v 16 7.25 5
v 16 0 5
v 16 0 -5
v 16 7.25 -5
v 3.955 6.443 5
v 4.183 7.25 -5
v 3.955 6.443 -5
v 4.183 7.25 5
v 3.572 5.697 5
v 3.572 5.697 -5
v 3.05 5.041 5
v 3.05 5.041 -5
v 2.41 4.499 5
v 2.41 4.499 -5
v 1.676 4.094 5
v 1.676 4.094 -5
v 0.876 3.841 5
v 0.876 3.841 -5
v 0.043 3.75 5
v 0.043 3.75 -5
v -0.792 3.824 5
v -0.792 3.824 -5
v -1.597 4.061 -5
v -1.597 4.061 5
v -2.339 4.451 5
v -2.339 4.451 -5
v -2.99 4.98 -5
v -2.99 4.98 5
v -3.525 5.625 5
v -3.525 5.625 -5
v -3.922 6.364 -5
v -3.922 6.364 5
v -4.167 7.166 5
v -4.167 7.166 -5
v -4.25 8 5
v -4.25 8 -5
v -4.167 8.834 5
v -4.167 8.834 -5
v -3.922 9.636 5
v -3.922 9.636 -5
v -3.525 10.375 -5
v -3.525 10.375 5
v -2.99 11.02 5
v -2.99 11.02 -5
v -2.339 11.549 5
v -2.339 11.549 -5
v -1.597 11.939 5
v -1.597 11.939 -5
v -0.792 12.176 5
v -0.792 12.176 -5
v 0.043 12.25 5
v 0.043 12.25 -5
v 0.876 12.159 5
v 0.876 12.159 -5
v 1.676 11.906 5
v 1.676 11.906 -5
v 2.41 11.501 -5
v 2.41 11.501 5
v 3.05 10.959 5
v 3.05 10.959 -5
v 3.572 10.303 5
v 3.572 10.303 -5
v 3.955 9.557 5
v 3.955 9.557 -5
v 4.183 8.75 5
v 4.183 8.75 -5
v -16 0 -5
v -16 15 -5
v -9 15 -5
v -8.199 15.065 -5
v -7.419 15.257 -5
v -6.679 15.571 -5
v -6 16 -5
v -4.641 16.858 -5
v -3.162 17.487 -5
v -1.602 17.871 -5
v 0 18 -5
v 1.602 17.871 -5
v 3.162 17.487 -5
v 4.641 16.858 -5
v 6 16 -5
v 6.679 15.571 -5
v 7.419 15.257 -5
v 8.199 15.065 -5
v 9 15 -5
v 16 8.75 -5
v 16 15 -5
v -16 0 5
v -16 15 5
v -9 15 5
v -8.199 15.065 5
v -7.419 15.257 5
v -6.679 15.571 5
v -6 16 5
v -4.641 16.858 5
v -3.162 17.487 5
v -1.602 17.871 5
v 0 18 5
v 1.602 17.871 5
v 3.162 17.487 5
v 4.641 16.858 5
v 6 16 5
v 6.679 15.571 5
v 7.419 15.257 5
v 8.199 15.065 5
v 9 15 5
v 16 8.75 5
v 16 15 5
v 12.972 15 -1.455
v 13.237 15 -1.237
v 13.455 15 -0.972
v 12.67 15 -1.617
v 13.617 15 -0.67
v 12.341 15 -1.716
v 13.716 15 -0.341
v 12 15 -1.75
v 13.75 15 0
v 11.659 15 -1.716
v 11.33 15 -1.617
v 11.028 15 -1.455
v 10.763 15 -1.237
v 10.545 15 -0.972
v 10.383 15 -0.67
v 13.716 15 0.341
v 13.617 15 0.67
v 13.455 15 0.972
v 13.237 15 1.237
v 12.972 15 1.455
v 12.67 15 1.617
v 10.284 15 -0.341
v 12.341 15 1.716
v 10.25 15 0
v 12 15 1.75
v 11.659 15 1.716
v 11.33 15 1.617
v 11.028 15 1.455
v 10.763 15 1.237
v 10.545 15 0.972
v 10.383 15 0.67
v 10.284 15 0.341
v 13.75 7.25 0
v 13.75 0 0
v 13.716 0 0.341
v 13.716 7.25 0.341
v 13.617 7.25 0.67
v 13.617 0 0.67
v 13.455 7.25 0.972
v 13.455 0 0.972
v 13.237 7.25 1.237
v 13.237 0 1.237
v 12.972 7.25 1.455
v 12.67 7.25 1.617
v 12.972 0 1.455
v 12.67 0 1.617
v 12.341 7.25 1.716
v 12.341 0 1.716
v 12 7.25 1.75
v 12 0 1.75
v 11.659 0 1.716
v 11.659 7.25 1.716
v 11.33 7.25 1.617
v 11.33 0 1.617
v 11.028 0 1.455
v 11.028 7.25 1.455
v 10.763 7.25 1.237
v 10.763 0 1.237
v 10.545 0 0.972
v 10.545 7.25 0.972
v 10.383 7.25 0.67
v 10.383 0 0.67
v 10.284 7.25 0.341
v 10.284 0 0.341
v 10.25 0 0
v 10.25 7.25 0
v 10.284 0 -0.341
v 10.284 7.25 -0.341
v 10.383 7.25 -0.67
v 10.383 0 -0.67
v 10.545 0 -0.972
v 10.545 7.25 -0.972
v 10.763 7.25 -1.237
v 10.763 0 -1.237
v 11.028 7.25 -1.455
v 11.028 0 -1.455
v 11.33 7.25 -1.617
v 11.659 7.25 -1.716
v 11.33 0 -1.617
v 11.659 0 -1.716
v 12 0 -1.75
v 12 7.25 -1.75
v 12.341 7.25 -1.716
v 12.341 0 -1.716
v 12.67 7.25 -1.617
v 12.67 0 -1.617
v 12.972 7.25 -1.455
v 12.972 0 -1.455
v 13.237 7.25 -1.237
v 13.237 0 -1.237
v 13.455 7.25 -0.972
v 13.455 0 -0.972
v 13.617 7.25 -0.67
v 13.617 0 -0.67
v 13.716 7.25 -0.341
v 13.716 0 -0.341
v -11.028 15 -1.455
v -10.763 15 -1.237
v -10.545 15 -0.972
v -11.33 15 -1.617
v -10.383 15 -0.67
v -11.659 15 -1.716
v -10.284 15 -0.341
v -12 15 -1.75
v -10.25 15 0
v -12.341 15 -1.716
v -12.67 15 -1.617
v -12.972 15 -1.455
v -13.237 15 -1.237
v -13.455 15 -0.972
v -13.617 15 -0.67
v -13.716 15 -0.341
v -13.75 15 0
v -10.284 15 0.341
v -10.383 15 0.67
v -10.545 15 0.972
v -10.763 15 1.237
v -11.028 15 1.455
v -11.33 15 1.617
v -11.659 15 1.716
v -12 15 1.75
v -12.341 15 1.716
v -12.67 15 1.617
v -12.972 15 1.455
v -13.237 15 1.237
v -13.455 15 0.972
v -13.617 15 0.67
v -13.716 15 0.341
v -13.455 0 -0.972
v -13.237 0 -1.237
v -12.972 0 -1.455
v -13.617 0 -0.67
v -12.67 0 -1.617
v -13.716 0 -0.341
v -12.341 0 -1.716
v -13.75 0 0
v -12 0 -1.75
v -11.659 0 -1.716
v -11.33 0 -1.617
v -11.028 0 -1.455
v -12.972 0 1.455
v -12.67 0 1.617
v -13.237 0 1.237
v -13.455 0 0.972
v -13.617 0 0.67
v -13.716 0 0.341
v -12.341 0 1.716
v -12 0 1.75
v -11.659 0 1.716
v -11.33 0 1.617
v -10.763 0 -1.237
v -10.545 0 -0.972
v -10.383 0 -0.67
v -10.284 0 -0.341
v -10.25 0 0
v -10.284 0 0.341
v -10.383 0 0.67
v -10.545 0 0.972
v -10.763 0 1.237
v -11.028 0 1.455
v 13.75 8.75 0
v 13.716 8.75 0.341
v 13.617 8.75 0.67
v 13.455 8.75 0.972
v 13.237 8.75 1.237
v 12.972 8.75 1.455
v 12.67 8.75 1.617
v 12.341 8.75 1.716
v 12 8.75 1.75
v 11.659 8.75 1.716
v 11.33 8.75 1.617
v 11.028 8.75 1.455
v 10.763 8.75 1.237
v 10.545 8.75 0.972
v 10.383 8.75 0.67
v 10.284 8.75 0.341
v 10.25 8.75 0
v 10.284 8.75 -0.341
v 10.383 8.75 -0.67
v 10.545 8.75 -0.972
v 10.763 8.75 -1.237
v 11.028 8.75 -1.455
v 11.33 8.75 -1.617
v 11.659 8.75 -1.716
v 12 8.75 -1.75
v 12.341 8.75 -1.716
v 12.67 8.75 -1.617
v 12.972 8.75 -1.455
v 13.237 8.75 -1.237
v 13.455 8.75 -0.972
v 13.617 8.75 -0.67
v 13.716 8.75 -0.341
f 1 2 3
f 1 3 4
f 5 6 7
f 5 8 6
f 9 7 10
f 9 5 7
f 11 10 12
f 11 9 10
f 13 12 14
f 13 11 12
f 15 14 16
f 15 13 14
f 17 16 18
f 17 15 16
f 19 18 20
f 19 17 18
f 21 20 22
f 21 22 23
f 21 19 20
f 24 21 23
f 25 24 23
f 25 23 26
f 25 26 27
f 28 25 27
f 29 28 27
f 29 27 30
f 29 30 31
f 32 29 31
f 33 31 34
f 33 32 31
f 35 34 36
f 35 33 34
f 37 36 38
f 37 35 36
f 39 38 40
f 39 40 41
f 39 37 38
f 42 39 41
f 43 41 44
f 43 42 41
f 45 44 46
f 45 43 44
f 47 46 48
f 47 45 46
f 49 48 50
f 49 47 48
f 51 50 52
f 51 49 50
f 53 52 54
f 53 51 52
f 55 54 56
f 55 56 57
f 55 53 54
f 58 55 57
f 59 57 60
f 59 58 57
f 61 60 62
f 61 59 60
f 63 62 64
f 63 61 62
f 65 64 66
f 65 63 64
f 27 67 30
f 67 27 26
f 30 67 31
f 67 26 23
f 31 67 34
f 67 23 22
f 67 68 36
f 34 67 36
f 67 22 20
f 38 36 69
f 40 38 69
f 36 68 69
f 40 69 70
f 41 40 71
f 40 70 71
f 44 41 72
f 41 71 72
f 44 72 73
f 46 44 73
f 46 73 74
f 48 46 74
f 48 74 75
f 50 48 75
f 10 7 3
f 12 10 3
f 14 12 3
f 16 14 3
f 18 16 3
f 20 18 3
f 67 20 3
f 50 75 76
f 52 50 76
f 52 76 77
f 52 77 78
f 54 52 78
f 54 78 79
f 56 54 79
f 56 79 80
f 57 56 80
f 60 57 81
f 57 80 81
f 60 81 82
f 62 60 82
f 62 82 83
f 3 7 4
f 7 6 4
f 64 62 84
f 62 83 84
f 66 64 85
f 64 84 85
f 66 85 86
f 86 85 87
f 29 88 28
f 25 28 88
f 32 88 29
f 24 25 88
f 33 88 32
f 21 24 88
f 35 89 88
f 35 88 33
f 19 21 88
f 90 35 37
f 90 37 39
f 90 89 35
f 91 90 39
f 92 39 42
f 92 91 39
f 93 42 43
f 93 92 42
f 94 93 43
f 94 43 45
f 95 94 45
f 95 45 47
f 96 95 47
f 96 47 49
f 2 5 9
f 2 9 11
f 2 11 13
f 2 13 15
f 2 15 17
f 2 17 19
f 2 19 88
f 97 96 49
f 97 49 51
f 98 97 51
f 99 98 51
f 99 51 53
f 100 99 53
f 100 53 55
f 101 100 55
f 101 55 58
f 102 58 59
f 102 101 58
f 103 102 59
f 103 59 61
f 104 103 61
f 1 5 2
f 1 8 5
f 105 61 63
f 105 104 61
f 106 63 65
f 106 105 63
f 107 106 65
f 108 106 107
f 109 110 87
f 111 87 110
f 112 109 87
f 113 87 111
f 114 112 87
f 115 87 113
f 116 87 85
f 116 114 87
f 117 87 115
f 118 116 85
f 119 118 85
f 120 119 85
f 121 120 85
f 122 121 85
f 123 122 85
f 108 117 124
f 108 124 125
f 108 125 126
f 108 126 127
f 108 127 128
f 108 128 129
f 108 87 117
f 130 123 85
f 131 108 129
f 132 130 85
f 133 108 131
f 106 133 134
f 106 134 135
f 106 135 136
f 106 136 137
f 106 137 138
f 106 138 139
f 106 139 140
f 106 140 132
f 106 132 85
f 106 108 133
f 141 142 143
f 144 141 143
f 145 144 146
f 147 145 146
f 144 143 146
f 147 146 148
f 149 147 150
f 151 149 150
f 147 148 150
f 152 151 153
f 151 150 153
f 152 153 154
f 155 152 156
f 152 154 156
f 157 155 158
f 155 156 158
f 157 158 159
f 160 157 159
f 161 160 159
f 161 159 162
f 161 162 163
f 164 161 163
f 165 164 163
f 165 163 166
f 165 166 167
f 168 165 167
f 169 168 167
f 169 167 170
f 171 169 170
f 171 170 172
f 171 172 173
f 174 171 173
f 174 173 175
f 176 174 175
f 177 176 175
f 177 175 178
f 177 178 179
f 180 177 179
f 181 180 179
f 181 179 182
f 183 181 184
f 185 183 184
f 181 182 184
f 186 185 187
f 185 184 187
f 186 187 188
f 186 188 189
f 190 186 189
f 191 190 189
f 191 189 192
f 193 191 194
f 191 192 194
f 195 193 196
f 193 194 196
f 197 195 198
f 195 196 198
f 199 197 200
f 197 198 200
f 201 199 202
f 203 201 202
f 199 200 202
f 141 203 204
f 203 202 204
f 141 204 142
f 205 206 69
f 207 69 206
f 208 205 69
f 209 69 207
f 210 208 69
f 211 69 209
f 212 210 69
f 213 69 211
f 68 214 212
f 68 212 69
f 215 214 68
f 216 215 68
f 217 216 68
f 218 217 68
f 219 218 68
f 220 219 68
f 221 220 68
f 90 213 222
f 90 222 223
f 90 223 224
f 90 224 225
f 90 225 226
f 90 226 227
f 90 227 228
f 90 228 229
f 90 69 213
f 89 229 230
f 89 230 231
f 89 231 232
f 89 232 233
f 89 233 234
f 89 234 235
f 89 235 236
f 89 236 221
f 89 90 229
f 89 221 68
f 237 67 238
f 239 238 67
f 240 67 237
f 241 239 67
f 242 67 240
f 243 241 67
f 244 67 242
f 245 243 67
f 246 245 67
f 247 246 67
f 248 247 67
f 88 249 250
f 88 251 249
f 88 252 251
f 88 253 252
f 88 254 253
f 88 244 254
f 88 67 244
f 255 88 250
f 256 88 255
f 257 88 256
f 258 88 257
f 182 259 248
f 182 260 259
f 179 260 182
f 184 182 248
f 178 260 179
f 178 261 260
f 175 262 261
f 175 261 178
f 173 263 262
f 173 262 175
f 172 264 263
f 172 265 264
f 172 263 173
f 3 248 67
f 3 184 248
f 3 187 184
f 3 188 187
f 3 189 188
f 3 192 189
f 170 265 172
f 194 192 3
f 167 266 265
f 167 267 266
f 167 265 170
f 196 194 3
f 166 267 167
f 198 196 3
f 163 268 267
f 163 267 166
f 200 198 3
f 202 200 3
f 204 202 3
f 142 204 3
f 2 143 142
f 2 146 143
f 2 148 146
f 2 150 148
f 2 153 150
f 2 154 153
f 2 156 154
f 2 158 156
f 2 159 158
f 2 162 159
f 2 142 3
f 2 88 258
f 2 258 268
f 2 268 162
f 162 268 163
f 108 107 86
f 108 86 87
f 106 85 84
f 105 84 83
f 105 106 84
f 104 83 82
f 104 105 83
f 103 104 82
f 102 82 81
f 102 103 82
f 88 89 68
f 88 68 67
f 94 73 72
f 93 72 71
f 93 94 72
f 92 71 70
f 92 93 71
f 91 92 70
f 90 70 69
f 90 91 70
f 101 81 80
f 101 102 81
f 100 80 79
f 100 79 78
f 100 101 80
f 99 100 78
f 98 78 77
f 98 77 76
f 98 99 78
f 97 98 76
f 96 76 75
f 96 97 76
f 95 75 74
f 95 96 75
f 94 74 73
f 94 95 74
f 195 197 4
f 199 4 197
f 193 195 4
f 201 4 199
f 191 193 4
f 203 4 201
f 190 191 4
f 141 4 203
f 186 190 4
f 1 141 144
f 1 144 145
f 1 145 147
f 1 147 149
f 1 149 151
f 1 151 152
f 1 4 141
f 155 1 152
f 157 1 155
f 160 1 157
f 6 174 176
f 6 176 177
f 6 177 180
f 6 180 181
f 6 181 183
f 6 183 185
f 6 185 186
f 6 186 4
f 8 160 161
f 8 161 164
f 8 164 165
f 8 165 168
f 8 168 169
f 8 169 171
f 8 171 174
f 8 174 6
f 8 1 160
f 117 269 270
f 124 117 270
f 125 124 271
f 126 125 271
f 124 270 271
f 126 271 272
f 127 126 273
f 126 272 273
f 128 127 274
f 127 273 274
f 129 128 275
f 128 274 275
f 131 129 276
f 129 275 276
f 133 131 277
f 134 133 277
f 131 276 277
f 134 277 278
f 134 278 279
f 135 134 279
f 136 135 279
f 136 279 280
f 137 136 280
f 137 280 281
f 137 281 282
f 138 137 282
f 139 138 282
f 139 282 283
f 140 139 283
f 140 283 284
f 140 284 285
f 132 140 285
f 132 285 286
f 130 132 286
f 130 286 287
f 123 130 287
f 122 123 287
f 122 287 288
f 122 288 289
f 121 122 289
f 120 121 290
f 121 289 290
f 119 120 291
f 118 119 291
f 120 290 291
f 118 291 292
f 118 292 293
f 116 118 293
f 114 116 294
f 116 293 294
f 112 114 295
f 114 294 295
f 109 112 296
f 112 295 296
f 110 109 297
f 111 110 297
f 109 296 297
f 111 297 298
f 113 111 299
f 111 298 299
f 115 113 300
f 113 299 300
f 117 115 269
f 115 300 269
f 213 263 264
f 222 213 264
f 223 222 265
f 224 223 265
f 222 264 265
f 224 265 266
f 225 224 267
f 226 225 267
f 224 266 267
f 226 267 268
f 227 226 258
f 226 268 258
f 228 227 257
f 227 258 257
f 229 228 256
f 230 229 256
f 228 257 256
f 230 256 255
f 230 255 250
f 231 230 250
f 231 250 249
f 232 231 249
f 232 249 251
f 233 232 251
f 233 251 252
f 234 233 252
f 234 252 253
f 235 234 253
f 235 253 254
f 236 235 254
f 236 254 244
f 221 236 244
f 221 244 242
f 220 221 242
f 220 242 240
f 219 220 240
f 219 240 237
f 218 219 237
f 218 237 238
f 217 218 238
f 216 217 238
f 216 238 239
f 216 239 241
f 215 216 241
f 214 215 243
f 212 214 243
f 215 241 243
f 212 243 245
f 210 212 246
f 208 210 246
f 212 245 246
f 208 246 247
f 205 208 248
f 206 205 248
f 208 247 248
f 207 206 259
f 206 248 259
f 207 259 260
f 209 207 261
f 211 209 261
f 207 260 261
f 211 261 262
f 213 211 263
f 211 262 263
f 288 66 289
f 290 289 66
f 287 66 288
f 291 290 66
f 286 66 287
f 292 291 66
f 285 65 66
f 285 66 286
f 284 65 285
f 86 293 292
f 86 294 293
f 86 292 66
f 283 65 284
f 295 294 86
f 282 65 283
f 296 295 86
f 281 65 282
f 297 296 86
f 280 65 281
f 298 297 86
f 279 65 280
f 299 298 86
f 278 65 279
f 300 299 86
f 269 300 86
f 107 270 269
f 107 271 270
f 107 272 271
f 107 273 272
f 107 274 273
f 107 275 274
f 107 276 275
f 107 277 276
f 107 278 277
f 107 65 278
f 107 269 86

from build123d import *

# Parameters (mm, degrees)
SALIENTE_EXTRUIR1_DEPTH      = 5
SALIENTE_EXTRUIR1_DEPTH_BACK = 5
CROQUIS6_R                   = 1.75
CORTAR_EXTRUIR4_DEPTH        = 25.596747752
REDONDEO1_R                  = 5


with BuildPart() as part:
    # Croquis1 → Saliente-Extruir1 (new, two sides: drawn at the far end of the back side and taken through both)
    with BuildSketch(Plane.XY.offset(-SALIENTE_EXTRUIR1_DEPTH_BACK)):
        with BuildLine():
            Line((4.183300133, 8.75), (16, 8.75))
            Line((16, 8.75), (16, 15))
            Line((16, 15), (7.141428429, 15))
            ThreePointArc((7.141428429, 15), (0, 18), (-7.141428429, 15))
            Line((-7.141428429, 15), (-16, 15))
            Line((-16, 15), (-16, 0))
            Line((-16, 0), (16, 0))
            Line((16, 0), (16, 7.25))
            Line((16, 7.25), (4.183300133, 7.25))
            ThreePointArc((4.183300133, 7.25), (-4.25, 8), (4.183300133, 8.75))
        make_face()
    extrude(amount=SALIENTE_EXTRUIR1_DEPTH + SALIENTE_EXTRUIR1_DEPTH_BACK)

    # Croquis6 → Cortar-Extruir4 (cut, through all)
    with BuildSketch(Plane.XZ):
        with Locations((-12, 0)):
            Circle(CROQUIS6_R)
        with Locations((12, 0)):
            Circle(CROQUIS6_R)
    extrude(amount=-CORTAR_EXTRUIR4_DEPTH, mode=Mode.SUBTRACT)

    # Redondeo1
    redondeo1_edges = [part.edges().sort_by_distance(p)[0] for p in [
        (-7.141428429, 15, 0),
        (7.141428429, 15, 0),
    ]]
    fillet(redondeo1_edges, radius=REDONDEO1_R)


solid = part.part
